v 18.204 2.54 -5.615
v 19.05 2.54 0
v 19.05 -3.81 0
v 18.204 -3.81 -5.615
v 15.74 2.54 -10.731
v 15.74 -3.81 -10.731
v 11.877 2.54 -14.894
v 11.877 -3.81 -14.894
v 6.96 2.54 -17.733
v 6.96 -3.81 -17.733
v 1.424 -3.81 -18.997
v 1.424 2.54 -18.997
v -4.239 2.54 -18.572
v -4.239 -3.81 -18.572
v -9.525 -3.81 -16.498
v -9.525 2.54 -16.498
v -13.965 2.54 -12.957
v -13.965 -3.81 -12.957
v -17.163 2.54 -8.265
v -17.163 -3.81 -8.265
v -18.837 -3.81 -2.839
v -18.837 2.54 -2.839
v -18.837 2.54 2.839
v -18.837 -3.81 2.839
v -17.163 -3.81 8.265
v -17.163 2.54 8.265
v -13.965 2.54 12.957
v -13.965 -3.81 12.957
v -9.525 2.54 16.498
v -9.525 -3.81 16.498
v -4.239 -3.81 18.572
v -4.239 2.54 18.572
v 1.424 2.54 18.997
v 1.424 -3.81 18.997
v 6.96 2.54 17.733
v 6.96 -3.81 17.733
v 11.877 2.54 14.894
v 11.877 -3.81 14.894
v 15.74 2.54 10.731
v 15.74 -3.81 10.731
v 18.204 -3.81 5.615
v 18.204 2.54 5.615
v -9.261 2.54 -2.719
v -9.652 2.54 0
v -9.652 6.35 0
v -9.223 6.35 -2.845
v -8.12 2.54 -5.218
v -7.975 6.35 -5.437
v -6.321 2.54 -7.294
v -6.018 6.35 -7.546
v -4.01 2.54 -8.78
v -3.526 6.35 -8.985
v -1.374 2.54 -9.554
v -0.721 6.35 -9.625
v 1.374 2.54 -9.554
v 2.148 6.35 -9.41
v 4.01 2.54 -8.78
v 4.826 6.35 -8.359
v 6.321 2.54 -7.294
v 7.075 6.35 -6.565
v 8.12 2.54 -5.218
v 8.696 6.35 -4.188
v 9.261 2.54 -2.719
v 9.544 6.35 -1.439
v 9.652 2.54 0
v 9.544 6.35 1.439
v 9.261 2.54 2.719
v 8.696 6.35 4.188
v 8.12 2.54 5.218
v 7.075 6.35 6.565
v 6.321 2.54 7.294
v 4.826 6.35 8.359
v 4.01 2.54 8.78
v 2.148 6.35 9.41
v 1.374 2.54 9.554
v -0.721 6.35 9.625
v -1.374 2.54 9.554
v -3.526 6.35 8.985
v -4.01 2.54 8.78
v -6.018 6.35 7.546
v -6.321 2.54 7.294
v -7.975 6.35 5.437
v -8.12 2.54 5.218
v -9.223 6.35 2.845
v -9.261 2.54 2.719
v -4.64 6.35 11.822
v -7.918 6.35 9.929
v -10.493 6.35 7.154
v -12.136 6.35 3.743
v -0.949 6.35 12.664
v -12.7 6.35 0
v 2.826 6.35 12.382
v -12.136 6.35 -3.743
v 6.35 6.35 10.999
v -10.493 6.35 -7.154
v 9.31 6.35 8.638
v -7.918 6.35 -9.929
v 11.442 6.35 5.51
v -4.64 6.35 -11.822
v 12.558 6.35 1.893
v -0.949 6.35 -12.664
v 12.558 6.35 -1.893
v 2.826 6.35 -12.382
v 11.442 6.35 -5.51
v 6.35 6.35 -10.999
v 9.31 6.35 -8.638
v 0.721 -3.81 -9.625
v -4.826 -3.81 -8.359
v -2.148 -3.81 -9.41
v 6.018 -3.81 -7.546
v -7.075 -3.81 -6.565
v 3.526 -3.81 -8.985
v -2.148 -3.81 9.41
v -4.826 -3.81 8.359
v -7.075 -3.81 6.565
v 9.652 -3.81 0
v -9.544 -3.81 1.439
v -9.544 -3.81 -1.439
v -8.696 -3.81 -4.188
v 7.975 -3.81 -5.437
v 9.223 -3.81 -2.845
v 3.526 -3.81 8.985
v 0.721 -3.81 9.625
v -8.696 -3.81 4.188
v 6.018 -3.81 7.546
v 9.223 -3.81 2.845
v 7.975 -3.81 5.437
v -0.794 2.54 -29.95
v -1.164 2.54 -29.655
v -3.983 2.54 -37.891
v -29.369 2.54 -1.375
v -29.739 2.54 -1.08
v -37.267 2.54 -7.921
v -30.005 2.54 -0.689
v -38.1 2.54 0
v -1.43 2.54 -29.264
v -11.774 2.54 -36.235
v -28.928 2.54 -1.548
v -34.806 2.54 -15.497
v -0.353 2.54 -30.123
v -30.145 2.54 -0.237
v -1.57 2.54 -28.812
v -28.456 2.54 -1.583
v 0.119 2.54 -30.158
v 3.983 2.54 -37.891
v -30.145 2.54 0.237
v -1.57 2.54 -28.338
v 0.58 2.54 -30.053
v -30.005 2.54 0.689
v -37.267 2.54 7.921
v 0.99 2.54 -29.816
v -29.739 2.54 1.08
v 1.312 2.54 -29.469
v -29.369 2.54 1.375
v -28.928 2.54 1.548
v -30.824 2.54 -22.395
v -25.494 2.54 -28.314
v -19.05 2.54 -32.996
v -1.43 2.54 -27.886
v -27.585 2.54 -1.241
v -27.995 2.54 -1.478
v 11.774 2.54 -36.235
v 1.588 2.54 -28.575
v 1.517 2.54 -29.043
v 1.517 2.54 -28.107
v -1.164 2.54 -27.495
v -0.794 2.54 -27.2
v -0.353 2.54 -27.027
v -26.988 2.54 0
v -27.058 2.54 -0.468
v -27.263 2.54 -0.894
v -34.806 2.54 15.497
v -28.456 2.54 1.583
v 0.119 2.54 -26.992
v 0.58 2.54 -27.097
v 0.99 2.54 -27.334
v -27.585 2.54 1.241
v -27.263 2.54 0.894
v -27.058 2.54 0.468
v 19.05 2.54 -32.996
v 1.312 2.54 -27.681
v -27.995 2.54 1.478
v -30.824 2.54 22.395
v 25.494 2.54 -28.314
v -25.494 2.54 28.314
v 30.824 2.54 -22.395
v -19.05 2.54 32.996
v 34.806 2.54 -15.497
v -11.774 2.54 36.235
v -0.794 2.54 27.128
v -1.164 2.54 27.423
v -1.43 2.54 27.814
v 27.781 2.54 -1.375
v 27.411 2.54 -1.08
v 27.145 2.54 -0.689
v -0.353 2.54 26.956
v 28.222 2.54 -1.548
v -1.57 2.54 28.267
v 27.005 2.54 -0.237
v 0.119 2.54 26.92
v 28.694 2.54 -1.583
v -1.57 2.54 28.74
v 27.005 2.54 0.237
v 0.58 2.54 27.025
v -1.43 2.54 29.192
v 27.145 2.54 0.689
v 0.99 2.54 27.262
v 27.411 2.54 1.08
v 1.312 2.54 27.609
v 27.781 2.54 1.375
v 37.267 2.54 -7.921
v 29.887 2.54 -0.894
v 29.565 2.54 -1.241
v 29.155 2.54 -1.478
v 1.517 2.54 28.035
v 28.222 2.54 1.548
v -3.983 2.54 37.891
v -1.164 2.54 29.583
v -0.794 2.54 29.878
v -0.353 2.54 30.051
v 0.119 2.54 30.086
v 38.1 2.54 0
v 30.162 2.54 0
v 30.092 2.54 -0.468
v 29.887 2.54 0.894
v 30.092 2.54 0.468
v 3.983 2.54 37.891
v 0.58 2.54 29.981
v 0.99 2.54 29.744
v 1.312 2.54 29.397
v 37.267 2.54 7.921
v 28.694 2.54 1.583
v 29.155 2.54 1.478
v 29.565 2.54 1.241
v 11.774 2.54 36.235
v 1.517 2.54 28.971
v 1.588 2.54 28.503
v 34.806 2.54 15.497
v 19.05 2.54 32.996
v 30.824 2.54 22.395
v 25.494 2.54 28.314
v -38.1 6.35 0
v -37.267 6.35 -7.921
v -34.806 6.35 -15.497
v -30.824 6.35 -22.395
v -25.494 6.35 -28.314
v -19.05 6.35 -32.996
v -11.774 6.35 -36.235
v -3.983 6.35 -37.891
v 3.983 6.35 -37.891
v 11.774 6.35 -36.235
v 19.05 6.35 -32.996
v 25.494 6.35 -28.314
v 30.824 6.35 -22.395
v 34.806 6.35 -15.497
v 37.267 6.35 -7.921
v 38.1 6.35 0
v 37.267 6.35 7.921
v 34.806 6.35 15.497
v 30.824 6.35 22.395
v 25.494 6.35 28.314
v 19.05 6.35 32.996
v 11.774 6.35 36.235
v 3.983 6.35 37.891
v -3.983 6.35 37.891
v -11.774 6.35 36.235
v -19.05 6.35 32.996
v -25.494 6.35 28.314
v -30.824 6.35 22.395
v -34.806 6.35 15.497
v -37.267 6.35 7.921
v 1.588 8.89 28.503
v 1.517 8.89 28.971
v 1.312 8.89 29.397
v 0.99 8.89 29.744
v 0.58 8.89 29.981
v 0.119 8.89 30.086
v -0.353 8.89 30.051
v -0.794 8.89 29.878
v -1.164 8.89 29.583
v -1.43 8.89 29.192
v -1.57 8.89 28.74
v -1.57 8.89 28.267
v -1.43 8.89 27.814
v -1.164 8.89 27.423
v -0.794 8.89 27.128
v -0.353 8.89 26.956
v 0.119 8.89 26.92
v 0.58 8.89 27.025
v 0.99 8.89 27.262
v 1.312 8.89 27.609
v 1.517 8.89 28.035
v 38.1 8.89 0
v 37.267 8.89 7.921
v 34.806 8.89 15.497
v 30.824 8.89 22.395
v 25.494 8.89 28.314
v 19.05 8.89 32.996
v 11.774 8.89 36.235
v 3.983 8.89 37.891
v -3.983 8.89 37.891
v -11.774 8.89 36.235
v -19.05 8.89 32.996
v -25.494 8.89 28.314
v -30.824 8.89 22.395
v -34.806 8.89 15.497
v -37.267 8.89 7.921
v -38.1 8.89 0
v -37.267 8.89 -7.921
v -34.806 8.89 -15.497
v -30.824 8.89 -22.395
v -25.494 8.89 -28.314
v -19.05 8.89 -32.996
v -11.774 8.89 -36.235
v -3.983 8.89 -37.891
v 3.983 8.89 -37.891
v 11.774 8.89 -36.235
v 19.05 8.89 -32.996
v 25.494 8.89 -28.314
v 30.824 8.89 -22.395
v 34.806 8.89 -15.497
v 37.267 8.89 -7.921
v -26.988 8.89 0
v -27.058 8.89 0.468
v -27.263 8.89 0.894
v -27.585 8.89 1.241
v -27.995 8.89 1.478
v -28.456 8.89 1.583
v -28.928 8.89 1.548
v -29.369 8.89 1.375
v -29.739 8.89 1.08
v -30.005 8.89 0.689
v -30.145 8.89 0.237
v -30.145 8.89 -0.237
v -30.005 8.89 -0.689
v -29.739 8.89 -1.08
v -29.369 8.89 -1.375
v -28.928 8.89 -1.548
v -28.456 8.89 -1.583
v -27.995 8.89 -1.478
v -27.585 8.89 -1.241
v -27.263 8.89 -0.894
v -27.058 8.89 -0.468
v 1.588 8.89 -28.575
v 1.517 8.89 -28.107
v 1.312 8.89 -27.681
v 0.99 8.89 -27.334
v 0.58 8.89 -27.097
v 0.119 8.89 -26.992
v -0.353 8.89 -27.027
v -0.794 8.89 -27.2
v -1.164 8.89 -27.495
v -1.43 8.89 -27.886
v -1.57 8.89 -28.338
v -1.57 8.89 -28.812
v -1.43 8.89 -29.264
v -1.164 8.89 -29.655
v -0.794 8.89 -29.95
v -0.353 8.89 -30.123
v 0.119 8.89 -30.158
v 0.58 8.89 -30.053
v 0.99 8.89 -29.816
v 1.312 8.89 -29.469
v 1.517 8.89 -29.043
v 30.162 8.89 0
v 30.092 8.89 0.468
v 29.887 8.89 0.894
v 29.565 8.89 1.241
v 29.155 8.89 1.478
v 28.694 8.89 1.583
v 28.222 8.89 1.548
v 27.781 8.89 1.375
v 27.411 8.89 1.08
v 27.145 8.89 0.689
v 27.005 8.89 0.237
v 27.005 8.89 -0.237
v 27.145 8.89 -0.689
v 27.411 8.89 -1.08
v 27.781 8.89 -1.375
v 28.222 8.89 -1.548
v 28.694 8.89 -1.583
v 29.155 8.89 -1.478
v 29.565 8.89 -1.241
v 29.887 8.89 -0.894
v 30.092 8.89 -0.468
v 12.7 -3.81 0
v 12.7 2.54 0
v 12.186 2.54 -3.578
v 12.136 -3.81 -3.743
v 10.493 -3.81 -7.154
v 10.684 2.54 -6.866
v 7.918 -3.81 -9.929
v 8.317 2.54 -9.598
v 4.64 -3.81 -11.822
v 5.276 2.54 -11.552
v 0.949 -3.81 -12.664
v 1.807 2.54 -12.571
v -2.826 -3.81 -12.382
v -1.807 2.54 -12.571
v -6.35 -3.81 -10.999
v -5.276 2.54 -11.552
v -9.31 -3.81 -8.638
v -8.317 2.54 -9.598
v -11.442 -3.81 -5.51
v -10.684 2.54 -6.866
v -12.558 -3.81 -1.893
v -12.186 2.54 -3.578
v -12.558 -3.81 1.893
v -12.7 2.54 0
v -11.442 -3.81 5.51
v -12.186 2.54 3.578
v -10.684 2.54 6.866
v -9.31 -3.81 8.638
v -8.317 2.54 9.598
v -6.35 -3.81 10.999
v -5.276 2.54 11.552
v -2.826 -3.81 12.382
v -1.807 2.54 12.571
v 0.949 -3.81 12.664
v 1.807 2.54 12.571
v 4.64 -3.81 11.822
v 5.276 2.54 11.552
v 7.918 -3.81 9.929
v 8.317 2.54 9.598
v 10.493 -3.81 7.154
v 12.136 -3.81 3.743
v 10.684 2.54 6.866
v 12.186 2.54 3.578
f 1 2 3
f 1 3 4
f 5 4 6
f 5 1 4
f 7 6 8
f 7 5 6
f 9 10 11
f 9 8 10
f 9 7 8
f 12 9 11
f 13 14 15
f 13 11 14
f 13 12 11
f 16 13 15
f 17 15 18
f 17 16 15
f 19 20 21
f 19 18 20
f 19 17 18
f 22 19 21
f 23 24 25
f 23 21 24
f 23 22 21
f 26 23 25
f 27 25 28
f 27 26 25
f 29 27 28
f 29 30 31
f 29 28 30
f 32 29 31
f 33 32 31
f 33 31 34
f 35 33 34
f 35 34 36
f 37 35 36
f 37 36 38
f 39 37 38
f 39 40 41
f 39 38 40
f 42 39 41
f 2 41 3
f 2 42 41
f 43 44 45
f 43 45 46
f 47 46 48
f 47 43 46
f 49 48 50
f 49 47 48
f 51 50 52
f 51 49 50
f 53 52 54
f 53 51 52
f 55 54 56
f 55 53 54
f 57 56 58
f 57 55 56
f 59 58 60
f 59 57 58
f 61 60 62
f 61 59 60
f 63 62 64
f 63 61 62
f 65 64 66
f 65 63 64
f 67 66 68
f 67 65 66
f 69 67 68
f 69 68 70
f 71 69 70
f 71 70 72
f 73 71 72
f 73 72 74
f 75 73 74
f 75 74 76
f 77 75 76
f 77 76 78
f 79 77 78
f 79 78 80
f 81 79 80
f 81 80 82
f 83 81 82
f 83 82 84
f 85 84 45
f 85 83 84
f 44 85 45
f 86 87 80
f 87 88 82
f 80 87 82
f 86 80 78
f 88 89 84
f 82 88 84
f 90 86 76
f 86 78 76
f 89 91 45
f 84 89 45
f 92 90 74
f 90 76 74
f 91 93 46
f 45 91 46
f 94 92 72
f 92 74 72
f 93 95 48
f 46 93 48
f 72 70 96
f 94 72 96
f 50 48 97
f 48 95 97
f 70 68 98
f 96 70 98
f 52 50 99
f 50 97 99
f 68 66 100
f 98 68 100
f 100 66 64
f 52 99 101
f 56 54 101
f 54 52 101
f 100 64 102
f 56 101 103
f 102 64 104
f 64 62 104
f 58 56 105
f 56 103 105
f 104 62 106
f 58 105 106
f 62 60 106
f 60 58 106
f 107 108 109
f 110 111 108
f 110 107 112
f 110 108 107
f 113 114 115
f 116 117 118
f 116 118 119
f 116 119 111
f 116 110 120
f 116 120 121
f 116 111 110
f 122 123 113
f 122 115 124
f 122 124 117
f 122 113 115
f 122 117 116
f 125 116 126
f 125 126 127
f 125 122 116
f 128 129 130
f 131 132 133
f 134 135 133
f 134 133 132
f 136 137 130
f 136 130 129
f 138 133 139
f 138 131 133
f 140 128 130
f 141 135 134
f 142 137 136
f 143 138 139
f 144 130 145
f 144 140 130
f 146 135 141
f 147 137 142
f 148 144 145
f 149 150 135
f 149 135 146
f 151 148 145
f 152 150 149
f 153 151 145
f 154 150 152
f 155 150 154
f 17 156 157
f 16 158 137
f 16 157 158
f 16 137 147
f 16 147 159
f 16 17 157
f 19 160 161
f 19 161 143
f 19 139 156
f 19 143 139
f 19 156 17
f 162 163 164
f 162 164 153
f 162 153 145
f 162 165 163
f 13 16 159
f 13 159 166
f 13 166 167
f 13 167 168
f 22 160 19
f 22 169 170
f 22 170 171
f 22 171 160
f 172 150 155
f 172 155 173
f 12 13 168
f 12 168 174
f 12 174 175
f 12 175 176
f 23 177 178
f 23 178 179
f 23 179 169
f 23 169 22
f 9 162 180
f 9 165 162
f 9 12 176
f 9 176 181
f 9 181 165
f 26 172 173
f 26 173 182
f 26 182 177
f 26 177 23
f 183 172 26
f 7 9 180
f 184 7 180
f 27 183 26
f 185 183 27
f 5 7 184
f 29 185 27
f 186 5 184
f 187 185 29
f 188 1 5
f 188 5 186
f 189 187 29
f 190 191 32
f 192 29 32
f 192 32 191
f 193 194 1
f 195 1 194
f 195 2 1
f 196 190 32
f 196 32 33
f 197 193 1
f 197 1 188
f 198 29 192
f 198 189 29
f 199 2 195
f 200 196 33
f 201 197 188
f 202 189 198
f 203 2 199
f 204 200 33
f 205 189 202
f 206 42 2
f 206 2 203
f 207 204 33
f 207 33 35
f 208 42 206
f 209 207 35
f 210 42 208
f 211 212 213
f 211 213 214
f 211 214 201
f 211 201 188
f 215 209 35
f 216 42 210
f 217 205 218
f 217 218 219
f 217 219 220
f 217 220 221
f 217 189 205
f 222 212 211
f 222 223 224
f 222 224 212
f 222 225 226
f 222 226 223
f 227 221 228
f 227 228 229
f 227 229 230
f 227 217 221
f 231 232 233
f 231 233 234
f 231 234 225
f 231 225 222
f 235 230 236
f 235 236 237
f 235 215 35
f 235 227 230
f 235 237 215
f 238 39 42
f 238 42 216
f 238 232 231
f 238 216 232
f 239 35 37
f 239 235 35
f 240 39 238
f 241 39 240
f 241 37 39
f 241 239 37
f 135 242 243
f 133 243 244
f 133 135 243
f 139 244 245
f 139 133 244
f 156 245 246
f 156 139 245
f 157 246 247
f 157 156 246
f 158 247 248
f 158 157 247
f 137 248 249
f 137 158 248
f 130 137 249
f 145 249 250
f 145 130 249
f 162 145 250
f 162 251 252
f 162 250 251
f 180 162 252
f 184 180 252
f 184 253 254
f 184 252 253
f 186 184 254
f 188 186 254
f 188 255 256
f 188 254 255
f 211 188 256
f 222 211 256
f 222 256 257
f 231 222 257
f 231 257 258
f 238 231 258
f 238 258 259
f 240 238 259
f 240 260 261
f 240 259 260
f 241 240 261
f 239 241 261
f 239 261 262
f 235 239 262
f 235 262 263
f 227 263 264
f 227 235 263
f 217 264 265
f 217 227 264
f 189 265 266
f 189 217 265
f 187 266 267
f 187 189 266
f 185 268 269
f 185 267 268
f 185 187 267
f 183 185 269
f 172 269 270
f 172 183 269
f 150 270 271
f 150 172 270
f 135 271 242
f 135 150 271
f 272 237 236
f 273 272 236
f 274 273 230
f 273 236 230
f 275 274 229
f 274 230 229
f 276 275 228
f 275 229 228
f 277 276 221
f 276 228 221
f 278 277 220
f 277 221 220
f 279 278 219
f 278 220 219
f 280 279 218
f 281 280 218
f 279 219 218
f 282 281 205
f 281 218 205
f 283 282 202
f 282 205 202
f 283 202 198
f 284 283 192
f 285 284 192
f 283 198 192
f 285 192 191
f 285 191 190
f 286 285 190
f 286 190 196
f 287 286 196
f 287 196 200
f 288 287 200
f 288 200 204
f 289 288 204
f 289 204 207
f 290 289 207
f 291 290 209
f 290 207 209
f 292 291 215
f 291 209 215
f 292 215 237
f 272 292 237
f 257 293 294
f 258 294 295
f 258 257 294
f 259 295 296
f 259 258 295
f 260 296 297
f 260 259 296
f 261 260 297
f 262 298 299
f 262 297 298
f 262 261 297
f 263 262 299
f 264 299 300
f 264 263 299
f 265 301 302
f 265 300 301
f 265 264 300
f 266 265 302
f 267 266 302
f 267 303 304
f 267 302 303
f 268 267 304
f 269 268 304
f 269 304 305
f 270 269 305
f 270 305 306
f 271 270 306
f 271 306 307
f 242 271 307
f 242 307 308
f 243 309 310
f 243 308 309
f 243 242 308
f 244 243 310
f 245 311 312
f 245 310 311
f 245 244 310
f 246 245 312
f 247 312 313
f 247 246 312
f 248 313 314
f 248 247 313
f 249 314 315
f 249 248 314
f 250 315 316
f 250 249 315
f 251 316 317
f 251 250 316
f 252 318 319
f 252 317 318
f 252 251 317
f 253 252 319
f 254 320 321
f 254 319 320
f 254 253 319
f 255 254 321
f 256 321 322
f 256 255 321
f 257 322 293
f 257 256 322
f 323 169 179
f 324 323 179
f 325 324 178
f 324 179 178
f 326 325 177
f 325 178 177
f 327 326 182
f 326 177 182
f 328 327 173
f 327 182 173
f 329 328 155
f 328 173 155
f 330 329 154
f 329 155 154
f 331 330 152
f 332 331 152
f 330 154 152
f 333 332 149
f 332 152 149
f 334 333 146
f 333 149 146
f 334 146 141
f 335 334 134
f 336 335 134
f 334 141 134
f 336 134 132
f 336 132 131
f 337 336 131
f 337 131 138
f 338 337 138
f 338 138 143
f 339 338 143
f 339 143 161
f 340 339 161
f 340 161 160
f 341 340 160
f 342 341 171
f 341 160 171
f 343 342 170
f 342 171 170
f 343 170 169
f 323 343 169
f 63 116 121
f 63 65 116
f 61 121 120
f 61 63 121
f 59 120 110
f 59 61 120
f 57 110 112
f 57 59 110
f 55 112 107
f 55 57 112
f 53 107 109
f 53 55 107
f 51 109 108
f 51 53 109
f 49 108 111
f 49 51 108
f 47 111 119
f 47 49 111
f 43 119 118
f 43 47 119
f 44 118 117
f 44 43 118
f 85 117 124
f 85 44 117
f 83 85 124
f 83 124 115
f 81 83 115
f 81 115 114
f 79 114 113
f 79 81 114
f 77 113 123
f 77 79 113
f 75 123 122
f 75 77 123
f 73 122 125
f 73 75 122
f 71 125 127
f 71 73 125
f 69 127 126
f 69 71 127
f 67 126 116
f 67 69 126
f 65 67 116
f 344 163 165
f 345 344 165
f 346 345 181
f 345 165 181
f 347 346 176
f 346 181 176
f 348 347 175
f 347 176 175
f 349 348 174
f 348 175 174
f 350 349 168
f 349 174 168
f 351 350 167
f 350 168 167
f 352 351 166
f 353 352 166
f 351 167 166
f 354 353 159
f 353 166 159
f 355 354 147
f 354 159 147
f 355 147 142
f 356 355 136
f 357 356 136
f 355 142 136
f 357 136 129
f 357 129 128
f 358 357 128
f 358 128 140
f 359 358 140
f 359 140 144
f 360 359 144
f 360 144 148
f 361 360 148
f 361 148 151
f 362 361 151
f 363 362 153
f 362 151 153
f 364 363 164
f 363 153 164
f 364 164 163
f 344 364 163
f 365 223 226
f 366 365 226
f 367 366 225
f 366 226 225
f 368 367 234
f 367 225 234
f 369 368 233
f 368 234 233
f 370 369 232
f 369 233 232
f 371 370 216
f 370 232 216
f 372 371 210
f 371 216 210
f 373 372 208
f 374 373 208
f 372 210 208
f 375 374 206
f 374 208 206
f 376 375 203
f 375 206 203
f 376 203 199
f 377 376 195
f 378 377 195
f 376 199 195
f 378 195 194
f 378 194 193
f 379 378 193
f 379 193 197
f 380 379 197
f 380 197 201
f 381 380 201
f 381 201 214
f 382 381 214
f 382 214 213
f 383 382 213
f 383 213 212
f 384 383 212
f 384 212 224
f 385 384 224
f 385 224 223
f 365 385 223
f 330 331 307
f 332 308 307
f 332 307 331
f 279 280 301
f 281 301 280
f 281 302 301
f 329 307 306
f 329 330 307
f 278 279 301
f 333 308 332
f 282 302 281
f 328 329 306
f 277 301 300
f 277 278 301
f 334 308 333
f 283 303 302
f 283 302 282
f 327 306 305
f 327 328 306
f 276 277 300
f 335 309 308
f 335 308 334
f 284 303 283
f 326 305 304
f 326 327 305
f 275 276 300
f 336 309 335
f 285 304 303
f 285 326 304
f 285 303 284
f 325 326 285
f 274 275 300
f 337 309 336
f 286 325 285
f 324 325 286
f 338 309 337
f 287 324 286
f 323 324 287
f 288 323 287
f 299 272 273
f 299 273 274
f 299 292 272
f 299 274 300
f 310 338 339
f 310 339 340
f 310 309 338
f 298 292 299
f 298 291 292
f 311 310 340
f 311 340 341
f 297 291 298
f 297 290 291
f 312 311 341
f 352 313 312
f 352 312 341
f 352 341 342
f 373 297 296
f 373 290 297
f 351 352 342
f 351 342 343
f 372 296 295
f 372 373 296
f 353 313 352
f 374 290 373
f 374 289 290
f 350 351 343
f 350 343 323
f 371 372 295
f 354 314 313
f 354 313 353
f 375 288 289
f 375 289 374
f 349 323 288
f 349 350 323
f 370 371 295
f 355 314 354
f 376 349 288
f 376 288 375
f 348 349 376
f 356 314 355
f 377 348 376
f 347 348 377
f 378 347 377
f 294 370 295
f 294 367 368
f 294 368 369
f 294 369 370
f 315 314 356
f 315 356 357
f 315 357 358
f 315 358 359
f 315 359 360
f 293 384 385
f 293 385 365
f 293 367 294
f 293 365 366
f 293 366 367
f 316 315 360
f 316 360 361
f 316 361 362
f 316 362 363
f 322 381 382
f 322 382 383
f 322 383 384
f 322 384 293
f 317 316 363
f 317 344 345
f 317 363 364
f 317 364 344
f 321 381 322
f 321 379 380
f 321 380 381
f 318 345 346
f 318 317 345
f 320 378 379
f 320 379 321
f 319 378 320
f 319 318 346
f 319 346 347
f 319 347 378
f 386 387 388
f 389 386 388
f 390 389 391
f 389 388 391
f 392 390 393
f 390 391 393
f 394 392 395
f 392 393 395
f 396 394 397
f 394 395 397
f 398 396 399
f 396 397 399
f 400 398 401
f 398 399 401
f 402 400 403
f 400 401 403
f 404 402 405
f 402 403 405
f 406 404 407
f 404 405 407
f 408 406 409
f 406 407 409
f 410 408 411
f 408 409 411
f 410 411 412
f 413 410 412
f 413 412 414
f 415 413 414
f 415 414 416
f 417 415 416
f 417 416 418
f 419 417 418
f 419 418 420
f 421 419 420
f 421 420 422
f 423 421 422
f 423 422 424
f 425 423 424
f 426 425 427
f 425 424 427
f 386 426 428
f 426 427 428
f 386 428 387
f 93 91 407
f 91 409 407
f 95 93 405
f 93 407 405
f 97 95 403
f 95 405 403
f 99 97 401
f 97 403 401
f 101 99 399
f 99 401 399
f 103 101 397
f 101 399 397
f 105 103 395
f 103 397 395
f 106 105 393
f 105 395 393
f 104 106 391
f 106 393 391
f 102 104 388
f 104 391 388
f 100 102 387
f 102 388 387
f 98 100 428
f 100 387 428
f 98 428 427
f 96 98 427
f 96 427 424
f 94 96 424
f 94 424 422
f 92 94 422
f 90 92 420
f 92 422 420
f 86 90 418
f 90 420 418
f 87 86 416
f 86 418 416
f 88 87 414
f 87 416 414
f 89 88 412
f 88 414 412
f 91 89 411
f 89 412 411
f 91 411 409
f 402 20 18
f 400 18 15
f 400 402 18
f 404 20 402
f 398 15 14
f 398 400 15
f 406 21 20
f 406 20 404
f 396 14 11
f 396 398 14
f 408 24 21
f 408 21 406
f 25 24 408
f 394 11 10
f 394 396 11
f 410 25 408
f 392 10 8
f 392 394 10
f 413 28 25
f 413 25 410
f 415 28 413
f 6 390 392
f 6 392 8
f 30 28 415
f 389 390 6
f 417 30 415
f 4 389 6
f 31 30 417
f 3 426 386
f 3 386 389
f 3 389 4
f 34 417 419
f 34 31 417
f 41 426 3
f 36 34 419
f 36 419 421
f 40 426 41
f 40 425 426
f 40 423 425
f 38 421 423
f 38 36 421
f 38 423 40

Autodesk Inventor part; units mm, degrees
ref_plane "YZ Plane" through (0, 0, 0) normal (1, 0, 0) x (0, 1, 0)
ref_plane "XZ Plane" through (0, 0, 0) normal (0, 1, 0) x (-1, 0, 0)
ref_plane "XY Plane" through (0, 0, 0) normal (0, 0, 1) x (1, 0, 0)
sketch "Sketch1" plane through (0, 0, 0) normal (0, 1, 0) x (-1, 0, 0)
  circle A0 centre (0, 0) radius 12.7
  circle A1 centre (0, 0) radius 9.652
  circle A2 centre (0, 0) radius 38.1
  dimension "d0" = 25.4
  dimension "d1" = 19.304
  dimension "d2" = 76.2
extrude "Extrusion1" add sketch "Sketch1" along normal blind 6.35
sketch "Sketch2" plane through (0, 6.35, 0) normal (0, 1, 0) x (1, 0, 0)
  circle A0 centre (0, 0) radius 38.1
extrude "Extrusion2" add sketch "Sketch2" along normal blind 2.54
sketch "Sketch3" plane through (0, 0, 0) normal (0, -1, 0) x (1, 0, 0)
  circle A0 centre (0, 0) radius 38.1
extrude "Extrusion3" cut sketch "Sketch3" against normal blind 2.54
sketch "Sketch4" plane through (0, 2.54, 0) normal (0, -1, 0) x (1, 0, 0)
  circle A0 centre (0, 0) radius 19.05
  circle A1 centre (0, 0) radius 12.7
  circle A2 centre (0, 0) radius 9.652
  dimension "d9" = 38.1
extrude "Extrusion4" add sketch "Sketch4" along normal blind 6.35
sketch "Sketch5" plane through (0, 2.54, 0) normal (0, -1, 0) x (1, 0, 0)
  circle A0 centre (0, 0) radius 38.1 projected
  line L0 (38.1, 0) -> (19.05, 0)
  circle A1 centre (0, 0) radius 19.05 projected
  line L1 (0, 18.9941) -> (0, 38.0123)
  line L2 (-19.05, 0) -> (-38.1, 0)
  line L3 (0, -19.05) -> (0, -38.1)
  circle A2 centre (0, 28.5032) radius 1.5875
  circle A3 centre (28.575, 0) radius 1.5875
  circle A4 centre (0, -28.575) radius 1.5875
  circle A5 centre (-28.575, 0) radius 1.5875
  dimension "d12" = 3.175
  dimension "d13" = 3.175
  dimension "d14" = 3.175
  dimension "d15" = 3.175
extrude "Extrusion5" cut sketch "Sketch5" against normal blind 6.35 contours A2 L1 | L1 A2 | A3 L0 | L0 A3 | A5 L2 | L2 A5 | A4 L3 | L3 A4
properties part number "CrankAttachment_SBail"
